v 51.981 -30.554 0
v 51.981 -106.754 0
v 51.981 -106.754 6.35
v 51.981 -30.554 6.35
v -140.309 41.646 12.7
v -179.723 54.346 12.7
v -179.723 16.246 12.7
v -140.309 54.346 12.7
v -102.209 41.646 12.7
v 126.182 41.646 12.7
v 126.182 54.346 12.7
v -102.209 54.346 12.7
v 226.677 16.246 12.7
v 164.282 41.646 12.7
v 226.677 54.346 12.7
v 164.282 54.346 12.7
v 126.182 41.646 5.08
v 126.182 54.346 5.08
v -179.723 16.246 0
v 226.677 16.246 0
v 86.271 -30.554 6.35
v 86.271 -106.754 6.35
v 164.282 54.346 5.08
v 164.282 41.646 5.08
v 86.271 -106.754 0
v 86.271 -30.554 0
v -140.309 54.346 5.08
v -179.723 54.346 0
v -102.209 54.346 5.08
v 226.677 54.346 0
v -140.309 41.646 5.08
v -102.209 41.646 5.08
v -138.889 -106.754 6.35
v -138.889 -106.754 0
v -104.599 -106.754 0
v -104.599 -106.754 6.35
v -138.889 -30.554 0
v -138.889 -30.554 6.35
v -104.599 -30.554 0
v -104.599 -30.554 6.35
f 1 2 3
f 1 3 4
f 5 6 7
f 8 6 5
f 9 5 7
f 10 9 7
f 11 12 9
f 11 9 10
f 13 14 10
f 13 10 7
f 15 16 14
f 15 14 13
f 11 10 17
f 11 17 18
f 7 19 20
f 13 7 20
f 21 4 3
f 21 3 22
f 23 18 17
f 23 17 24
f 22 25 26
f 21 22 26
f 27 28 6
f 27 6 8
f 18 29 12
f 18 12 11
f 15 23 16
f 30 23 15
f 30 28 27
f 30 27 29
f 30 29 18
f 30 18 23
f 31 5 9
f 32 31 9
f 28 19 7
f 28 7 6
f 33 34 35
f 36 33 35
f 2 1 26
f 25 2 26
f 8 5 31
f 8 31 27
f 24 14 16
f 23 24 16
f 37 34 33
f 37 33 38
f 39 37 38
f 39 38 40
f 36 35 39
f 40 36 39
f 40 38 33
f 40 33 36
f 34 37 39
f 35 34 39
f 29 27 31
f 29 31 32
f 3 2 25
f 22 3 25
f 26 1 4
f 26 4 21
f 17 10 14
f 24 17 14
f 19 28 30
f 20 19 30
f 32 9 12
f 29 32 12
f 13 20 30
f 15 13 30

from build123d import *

# Parameters (mm, degrees)
F0_W     = 406.4
F0_H     = 38.1
F1_DEPTH = 12.7
F2_W     = 38.1
F2_H     = 12.7
F3_DEPTH = 7.62
F4_W     = 34.29
F4_H     = 76.2
F5_DEPTH = 6.35


with BuildPart() as f1:
    # F0 (on Top) → F1 (new body)
    with BuildSketch(Plane.XY):
        with Locations((23.47656, 35.295876)):
            Rectangle(F0_W, F0_H)
    extrude(amount=F1_DEPTH)

    # F2 (on face) → F3 (cut)
    with BuildSketch(Plane.XY.offset(12.7)):
        with Locations((-121.258619, 47.995876)):
            Rectangle(F2_W, F2_H)
        with Locations((145.232199, 47.995876)):
            Rectangle(F2_W, F2_H)
    extrude(amount=-F3_DEPTH, mode=Mode.SUBTRACT)


with BuildPart() as f5:
    # F4 (on Top) → F5 (new body)
    with BuildSketch(Plane.XY):
        with Locations((-121.743635, -68.65374)):
            Rectangle(F4_W, F4_H)
        with Locations((69.126278, -68.65374)):
            Rectangle(F4_W, F4_H)
    extrude(amount=F5_DEPTH)


solid = Compound([f1.part, f5.part])
